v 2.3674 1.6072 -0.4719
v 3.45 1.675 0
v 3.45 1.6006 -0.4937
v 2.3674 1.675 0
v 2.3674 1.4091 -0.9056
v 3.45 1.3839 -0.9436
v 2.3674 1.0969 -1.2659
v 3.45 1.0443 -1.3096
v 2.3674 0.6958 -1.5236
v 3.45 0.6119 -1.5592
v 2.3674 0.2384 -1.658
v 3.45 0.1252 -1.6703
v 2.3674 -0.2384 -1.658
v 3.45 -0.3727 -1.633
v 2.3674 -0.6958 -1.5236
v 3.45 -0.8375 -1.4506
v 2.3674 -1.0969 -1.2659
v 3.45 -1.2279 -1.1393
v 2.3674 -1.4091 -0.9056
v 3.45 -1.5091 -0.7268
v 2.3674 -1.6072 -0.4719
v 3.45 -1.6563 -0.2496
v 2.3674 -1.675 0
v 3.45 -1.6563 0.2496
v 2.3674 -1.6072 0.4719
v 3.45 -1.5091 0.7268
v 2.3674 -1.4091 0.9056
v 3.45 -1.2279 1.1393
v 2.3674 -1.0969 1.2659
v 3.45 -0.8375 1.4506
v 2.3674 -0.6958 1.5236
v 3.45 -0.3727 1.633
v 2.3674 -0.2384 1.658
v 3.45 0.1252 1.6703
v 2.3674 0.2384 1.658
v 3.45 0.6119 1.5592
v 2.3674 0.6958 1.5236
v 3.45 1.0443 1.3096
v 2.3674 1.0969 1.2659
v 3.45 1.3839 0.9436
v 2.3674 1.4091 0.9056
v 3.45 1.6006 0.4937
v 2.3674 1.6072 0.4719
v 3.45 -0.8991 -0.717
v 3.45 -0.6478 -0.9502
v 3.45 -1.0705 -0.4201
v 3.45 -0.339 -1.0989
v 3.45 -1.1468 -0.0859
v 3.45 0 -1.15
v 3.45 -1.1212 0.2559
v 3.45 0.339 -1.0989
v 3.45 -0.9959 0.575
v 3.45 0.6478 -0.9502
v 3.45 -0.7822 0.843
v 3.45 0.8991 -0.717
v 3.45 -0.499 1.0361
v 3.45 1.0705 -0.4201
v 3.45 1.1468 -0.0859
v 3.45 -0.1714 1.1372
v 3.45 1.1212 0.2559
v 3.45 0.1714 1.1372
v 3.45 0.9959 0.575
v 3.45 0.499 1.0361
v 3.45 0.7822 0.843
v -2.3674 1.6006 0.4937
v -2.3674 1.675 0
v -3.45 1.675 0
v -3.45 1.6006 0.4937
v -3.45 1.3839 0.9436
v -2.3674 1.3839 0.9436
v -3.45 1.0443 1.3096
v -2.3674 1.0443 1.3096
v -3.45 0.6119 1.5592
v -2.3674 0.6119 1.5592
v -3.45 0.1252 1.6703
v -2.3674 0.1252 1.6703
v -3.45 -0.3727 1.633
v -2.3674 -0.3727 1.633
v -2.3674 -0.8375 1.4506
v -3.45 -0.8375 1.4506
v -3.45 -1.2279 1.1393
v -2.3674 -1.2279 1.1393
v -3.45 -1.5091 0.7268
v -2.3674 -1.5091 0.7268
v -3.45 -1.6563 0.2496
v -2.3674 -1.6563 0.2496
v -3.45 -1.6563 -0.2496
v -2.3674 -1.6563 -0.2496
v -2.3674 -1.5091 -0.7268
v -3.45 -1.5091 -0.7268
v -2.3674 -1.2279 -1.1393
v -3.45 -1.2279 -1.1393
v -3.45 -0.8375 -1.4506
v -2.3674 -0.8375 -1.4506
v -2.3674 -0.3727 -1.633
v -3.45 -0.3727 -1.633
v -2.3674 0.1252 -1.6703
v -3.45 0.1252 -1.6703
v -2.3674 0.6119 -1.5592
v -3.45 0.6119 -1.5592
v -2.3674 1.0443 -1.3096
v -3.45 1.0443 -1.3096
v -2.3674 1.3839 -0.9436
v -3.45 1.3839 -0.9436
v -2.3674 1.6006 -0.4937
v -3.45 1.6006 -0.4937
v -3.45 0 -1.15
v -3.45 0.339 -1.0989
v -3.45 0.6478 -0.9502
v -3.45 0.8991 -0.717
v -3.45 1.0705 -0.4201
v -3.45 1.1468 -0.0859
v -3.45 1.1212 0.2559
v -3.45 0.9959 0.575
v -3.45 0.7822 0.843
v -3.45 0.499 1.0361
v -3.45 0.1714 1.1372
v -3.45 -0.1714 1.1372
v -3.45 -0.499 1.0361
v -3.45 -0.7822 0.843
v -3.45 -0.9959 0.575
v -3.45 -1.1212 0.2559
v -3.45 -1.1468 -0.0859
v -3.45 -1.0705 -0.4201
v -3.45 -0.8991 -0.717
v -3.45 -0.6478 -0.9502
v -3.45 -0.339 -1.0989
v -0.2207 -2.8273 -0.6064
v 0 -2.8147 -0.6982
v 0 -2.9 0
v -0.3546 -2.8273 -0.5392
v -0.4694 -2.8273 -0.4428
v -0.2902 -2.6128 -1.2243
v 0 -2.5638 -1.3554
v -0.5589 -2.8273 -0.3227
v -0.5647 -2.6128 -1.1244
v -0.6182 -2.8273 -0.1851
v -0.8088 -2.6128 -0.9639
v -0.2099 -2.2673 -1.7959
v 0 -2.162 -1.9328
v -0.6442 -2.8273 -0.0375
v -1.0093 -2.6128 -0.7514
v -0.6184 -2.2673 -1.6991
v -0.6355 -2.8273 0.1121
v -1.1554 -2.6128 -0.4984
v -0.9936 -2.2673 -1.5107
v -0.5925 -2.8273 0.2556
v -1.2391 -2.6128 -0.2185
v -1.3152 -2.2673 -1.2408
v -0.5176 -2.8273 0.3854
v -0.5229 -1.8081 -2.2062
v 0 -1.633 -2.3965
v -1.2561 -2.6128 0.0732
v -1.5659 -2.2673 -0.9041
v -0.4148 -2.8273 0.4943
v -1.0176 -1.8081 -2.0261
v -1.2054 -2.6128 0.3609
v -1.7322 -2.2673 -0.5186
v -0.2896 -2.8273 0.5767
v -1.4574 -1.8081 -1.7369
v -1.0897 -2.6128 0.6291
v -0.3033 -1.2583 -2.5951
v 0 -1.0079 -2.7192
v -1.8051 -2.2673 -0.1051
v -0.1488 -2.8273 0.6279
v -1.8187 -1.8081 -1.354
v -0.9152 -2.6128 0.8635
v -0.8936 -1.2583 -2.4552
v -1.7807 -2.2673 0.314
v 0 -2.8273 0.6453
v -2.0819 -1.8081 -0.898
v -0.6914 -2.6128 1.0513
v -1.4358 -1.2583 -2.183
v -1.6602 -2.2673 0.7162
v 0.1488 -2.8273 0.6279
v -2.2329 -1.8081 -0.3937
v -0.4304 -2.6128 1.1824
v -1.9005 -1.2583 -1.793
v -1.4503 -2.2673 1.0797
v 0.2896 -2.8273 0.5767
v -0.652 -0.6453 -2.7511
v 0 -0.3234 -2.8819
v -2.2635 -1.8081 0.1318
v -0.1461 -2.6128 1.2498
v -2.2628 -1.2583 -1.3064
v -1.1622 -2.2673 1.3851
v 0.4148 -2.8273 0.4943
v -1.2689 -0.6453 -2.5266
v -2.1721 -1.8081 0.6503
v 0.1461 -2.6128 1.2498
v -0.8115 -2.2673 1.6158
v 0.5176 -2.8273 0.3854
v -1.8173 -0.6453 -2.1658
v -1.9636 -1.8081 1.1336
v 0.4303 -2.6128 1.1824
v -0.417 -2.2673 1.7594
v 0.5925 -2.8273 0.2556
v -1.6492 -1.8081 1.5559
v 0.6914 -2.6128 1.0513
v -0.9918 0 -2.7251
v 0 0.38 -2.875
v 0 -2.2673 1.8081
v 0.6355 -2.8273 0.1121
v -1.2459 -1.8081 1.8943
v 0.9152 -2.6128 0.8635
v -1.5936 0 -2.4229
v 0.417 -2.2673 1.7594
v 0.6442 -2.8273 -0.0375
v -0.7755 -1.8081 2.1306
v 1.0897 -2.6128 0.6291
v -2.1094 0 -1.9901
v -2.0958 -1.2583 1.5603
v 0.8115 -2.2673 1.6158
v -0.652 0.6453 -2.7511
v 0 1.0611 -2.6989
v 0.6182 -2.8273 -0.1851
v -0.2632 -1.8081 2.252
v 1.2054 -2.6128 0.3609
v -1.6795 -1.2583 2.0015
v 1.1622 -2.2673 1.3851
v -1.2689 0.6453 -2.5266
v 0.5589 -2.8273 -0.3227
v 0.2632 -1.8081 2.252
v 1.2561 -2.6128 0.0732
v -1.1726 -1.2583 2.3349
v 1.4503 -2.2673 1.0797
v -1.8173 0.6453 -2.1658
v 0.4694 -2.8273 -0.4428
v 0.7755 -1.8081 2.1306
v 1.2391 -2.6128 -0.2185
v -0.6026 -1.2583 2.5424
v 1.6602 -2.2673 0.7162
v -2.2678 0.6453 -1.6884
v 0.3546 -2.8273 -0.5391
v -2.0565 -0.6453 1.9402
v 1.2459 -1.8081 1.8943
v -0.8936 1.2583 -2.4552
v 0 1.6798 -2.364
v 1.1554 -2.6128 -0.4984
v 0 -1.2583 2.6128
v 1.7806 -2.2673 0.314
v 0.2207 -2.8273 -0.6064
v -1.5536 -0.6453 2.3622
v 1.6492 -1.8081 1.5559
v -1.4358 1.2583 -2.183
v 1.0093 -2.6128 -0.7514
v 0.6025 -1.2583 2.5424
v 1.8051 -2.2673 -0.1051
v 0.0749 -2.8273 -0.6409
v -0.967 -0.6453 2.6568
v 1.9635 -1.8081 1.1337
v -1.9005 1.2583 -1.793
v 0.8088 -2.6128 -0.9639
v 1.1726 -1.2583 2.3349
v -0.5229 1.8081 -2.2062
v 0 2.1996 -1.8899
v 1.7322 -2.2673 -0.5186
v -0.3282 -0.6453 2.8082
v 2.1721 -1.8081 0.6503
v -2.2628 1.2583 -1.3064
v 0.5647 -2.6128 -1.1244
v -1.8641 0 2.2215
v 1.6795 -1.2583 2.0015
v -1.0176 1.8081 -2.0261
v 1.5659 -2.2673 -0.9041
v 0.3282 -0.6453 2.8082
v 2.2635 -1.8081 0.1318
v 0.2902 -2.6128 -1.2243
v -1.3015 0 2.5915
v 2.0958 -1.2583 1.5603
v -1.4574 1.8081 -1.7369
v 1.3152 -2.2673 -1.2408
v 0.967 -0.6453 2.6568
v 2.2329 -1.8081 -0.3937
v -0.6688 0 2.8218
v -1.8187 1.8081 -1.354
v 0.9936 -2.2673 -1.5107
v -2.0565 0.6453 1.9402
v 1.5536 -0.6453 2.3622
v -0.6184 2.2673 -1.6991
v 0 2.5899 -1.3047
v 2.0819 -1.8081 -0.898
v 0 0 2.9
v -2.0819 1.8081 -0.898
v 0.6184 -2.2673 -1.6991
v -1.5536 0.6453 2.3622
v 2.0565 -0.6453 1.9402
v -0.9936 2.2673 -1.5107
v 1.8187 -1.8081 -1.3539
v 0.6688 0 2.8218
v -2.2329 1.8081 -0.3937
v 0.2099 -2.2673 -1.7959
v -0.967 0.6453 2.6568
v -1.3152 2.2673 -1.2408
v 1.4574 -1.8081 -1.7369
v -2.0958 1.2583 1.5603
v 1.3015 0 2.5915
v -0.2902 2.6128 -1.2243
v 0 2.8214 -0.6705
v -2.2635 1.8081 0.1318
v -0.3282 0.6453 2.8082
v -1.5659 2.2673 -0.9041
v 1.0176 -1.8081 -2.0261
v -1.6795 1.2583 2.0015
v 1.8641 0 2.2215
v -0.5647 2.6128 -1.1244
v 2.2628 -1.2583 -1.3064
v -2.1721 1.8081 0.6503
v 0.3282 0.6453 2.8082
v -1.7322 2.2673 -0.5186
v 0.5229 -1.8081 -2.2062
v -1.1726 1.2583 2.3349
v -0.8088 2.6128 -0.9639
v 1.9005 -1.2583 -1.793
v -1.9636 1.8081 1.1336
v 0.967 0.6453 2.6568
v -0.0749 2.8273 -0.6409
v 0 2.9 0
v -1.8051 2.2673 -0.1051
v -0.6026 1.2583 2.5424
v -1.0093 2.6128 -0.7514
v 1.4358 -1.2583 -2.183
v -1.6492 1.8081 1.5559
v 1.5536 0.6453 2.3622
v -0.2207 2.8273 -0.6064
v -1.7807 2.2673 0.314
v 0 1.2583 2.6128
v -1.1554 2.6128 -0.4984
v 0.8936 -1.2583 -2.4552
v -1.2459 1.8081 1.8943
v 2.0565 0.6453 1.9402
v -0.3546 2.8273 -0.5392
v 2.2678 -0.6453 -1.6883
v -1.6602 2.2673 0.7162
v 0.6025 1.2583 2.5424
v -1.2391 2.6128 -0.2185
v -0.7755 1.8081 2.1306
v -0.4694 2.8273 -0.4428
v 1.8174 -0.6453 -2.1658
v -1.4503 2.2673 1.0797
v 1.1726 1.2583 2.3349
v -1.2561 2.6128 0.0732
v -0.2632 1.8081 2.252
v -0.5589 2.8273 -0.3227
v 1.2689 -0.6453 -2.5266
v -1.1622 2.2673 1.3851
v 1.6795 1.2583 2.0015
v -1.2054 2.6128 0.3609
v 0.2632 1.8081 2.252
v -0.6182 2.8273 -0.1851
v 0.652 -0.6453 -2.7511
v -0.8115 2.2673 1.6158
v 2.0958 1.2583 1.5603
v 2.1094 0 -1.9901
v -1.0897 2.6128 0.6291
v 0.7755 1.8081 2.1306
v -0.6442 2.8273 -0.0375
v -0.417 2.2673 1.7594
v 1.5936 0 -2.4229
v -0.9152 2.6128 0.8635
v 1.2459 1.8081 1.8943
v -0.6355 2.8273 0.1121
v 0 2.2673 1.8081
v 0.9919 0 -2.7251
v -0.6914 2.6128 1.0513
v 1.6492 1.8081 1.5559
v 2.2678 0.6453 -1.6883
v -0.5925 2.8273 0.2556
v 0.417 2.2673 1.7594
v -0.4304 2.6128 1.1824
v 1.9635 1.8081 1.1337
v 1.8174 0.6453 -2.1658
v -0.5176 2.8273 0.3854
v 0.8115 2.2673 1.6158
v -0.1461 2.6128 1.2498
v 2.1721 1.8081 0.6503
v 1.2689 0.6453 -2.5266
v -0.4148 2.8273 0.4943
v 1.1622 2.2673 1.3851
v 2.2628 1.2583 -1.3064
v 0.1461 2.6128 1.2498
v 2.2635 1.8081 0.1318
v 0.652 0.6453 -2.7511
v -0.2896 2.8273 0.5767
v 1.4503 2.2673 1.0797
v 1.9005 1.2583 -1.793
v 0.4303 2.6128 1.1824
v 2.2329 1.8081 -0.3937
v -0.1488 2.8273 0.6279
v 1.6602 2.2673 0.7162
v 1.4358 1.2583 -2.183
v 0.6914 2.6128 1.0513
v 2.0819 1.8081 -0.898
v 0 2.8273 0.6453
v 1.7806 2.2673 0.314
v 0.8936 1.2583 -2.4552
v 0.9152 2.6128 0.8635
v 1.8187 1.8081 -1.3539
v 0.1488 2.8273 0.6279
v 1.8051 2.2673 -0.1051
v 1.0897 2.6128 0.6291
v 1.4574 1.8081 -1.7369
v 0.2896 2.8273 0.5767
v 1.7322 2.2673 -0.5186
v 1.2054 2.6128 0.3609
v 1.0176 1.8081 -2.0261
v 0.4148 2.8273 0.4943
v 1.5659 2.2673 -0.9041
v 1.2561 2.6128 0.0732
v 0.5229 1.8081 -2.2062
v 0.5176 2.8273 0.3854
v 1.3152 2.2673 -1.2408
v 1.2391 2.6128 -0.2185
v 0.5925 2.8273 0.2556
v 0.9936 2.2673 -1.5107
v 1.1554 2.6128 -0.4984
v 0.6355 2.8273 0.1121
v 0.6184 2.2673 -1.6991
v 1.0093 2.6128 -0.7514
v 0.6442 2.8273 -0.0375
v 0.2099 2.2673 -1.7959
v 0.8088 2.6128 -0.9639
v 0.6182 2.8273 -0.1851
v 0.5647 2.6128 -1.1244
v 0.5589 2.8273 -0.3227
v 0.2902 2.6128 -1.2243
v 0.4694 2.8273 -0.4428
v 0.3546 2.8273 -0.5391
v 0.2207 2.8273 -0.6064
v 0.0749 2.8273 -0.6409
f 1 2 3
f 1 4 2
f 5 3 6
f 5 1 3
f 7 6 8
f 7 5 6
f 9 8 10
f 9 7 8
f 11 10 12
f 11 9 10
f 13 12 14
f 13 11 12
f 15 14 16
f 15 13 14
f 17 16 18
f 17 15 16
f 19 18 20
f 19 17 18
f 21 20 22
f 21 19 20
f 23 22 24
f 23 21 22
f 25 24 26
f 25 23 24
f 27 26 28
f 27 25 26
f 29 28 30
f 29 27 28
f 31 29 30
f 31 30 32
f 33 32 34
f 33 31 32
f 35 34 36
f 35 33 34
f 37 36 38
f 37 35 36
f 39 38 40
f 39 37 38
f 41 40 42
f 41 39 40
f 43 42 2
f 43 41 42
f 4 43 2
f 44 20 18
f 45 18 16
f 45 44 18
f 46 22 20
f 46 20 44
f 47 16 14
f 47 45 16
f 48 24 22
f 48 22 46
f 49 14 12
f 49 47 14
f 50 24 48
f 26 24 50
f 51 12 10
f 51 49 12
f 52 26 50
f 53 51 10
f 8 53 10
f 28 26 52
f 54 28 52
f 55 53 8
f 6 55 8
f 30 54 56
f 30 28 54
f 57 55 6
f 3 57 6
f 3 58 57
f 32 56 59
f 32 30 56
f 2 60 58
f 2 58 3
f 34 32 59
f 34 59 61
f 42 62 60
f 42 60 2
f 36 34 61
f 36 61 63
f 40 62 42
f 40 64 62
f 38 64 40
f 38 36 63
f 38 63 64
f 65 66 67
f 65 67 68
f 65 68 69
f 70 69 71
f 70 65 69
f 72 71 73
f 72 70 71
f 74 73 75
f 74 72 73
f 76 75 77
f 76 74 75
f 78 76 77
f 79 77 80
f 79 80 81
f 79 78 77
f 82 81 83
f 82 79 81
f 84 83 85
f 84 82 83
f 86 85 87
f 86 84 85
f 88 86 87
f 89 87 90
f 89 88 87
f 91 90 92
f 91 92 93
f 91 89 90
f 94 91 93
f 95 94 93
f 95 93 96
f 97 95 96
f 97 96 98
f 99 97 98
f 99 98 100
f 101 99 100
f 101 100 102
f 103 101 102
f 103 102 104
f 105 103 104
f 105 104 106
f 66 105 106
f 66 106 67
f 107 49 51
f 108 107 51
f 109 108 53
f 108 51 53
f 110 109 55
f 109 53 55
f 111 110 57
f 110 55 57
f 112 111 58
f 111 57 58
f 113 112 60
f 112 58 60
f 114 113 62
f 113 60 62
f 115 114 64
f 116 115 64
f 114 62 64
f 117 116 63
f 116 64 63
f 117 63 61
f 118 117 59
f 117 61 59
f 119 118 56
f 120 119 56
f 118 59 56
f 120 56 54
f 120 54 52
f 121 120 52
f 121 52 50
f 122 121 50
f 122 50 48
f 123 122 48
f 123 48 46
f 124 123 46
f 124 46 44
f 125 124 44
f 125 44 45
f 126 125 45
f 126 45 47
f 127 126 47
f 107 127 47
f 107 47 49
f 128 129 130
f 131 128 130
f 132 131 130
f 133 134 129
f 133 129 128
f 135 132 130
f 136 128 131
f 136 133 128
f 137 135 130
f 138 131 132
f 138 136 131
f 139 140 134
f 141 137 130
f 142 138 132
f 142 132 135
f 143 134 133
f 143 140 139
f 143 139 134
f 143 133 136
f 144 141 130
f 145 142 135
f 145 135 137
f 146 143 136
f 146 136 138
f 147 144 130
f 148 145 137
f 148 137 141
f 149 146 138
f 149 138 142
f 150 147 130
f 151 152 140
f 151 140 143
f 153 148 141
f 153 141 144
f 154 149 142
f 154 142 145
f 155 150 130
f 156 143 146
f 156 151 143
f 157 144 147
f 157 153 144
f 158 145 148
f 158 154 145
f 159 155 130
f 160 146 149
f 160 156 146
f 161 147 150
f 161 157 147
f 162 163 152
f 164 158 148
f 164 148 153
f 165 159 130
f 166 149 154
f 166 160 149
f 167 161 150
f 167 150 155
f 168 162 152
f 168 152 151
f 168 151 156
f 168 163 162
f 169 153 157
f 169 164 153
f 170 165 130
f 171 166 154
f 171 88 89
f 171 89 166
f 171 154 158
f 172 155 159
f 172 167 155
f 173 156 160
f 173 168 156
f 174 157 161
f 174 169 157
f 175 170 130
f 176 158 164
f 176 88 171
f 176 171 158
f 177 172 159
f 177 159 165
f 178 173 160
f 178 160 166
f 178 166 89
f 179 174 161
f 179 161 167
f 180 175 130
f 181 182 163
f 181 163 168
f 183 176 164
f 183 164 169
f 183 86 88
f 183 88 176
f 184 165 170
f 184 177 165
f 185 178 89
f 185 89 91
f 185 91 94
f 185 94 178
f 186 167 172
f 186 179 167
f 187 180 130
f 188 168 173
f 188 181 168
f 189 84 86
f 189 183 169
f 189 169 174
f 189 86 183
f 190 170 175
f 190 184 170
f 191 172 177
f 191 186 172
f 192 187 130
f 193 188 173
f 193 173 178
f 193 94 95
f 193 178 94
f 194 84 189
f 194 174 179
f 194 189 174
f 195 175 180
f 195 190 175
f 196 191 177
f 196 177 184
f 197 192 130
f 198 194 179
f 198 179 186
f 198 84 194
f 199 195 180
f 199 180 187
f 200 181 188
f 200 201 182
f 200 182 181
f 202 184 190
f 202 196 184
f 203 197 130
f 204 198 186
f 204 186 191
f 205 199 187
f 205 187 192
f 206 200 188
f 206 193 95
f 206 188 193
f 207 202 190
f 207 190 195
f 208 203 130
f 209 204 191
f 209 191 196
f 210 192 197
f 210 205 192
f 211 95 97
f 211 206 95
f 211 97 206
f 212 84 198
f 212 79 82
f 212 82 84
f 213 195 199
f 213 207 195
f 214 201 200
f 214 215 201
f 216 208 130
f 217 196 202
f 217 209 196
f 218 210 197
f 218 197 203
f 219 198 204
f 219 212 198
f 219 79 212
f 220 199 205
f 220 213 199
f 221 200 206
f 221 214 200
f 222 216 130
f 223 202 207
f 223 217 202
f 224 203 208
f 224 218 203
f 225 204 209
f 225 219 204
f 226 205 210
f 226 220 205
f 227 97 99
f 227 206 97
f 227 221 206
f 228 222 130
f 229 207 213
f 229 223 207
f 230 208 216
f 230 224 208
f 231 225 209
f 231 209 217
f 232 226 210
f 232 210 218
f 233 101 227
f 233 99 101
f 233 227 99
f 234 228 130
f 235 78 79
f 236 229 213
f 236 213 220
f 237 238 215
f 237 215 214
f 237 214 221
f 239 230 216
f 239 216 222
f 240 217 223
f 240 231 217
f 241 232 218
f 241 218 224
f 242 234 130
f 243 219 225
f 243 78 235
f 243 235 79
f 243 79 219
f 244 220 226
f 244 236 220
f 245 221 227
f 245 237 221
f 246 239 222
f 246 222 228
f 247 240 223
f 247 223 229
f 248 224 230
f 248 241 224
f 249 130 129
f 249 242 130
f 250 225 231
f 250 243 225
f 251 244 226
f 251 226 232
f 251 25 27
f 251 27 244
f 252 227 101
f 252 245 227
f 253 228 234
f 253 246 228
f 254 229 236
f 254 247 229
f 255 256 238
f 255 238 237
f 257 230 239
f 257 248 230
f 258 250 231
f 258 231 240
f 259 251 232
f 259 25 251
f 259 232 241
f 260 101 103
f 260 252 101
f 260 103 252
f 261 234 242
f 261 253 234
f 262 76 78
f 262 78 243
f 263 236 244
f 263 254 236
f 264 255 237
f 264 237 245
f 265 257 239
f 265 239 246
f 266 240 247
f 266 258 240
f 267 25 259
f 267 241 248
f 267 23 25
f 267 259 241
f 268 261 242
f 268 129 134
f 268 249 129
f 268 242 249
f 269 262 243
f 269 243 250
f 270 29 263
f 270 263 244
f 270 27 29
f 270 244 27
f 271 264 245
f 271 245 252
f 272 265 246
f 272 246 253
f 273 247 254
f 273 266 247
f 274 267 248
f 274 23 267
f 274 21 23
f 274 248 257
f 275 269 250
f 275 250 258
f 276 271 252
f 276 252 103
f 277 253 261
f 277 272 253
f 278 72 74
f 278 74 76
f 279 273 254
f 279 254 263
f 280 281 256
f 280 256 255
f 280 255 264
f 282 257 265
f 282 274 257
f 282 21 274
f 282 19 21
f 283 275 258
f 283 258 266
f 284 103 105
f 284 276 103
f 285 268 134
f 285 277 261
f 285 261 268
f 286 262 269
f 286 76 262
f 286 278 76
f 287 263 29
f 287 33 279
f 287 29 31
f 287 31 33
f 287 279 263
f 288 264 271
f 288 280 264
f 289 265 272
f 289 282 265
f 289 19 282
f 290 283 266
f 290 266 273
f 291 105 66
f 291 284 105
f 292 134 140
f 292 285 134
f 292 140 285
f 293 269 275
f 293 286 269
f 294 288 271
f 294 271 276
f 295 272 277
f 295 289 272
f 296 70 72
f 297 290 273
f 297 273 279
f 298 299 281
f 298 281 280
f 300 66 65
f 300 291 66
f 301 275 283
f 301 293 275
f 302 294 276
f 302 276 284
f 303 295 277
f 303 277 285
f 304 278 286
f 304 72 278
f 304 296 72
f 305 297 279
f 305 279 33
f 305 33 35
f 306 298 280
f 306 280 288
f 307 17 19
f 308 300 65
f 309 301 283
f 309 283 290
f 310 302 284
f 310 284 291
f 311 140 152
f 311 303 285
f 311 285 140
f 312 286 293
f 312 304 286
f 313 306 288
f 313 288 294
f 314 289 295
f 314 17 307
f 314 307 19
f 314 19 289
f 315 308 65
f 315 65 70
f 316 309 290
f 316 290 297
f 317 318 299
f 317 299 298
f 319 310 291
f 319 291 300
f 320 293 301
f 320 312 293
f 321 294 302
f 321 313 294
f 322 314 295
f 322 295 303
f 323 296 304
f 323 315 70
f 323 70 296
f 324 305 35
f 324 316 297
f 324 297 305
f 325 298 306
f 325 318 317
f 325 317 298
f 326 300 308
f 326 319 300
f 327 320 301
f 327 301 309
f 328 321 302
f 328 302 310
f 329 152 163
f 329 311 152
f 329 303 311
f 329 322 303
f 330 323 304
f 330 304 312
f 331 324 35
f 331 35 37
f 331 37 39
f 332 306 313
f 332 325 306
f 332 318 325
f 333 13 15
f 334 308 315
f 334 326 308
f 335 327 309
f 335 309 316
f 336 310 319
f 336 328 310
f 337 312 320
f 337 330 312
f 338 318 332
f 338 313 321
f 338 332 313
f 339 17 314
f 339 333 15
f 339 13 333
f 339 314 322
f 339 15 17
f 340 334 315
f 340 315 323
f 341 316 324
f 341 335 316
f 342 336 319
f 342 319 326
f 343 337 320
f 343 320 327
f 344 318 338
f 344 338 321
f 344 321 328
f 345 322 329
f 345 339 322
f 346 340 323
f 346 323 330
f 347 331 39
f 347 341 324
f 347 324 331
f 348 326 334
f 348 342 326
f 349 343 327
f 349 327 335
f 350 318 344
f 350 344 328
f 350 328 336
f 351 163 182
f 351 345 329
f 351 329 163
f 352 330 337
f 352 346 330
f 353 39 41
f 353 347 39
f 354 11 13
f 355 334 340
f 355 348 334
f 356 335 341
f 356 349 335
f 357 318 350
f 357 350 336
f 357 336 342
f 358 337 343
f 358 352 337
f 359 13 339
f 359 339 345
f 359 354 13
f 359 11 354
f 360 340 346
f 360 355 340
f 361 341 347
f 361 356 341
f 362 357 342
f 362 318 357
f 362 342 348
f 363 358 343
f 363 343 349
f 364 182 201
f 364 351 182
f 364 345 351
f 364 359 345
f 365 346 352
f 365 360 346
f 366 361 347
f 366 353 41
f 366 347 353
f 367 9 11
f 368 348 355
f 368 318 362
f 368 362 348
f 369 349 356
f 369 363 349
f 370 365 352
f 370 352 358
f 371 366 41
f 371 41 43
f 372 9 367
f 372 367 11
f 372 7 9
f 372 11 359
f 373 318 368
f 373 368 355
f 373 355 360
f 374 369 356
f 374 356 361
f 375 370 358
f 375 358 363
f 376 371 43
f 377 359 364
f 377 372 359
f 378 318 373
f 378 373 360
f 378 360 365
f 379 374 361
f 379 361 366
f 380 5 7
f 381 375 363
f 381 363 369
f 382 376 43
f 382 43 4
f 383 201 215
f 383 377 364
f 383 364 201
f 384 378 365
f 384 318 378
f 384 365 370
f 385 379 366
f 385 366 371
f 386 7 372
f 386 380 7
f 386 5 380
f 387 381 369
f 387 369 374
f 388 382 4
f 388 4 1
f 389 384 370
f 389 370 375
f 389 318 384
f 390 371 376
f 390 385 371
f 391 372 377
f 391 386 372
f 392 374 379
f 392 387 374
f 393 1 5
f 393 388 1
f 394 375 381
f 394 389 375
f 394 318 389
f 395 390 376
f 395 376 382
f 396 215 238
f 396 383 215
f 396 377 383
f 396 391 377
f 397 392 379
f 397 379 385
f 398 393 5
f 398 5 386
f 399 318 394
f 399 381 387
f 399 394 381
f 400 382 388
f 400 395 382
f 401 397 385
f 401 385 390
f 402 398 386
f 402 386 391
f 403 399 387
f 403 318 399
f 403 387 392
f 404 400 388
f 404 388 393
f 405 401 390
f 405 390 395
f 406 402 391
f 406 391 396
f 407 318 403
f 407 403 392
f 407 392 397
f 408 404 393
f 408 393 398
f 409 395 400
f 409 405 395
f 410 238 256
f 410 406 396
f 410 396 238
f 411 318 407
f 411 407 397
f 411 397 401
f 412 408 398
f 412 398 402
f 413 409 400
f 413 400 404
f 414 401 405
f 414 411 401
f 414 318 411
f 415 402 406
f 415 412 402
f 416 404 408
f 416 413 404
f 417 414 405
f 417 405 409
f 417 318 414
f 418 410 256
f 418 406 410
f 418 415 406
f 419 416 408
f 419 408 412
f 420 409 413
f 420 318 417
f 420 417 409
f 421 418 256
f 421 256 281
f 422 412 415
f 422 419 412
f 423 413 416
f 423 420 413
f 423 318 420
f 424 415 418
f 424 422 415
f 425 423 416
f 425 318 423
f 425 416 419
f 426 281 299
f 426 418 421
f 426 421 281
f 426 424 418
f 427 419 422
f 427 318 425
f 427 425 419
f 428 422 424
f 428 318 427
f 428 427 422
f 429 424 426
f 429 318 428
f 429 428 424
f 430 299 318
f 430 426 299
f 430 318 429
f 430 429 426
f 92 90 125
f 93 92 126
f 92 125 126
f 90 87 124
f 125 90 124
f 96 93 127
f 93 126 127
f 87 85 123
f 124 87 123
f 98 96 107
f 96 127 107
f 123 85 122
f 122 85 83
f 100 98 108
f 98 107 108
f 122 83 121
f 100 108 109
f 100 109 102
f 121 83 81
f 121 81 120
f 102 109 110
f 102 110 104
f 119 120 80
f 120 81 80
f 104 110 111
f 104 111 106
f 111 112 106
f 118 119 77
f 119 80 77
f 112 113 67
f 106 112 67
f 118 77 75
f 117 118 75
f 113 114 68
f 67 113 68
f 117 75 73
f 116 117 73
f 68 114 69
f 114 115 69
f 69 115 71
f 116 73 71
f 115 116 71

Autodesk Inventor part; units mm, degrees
ref_plane "YZ Plane" through (0, 0, 0) normal (1, 0, 0) x (0, 1, 0)
ref_plane "XZ Plane" through (0, 0, 0) normal (0, 1, 0) x (-1, 0, 0)
ref_plane "XY Plane" through (0, 0, 0) normal (0, 0, 1) x (1, 0, 0)
sketch "Sketch1" plane through (0, 0, 0) normal (0, 0, 1) x (1, 0, 0)
  arc A0 (0, -2.9) -> (0, 2.9) centre (0, 0) ccw
  line L0 (0, 0) -> (0, 2.9)
  line L1 (0, 0) -> (0, -2.9)
  dimension "d0" = 5.8
revolve "Revolution1" add sketch "Sketch1" angle 360 about axis through (0, 0, 0) along (0, 1, 0)
sketch "Sketch3" plane through (0, 0, 0) normal (1, 0, 0) x (0, 1, 0)
  circle A0 centre (0, 0) radius 1.675
  dimension "d4" = 3.35
extrude "Extrusion1" add sketch "Sketch3" along normal mid plane 6.9
sketch "Sketch4" plane through (3.45, 0, 0) normal (1, 0, 0) x (0, 0, -1)
  circle A0 centre (0, 0) radius 1.15
  dimension "d7" = 2.3
extrude "Extrusion2" cut sketch "Sketch4" against normal blind 6.9
properties part number "RCT-H017_lower_linkage_ball_stud"
